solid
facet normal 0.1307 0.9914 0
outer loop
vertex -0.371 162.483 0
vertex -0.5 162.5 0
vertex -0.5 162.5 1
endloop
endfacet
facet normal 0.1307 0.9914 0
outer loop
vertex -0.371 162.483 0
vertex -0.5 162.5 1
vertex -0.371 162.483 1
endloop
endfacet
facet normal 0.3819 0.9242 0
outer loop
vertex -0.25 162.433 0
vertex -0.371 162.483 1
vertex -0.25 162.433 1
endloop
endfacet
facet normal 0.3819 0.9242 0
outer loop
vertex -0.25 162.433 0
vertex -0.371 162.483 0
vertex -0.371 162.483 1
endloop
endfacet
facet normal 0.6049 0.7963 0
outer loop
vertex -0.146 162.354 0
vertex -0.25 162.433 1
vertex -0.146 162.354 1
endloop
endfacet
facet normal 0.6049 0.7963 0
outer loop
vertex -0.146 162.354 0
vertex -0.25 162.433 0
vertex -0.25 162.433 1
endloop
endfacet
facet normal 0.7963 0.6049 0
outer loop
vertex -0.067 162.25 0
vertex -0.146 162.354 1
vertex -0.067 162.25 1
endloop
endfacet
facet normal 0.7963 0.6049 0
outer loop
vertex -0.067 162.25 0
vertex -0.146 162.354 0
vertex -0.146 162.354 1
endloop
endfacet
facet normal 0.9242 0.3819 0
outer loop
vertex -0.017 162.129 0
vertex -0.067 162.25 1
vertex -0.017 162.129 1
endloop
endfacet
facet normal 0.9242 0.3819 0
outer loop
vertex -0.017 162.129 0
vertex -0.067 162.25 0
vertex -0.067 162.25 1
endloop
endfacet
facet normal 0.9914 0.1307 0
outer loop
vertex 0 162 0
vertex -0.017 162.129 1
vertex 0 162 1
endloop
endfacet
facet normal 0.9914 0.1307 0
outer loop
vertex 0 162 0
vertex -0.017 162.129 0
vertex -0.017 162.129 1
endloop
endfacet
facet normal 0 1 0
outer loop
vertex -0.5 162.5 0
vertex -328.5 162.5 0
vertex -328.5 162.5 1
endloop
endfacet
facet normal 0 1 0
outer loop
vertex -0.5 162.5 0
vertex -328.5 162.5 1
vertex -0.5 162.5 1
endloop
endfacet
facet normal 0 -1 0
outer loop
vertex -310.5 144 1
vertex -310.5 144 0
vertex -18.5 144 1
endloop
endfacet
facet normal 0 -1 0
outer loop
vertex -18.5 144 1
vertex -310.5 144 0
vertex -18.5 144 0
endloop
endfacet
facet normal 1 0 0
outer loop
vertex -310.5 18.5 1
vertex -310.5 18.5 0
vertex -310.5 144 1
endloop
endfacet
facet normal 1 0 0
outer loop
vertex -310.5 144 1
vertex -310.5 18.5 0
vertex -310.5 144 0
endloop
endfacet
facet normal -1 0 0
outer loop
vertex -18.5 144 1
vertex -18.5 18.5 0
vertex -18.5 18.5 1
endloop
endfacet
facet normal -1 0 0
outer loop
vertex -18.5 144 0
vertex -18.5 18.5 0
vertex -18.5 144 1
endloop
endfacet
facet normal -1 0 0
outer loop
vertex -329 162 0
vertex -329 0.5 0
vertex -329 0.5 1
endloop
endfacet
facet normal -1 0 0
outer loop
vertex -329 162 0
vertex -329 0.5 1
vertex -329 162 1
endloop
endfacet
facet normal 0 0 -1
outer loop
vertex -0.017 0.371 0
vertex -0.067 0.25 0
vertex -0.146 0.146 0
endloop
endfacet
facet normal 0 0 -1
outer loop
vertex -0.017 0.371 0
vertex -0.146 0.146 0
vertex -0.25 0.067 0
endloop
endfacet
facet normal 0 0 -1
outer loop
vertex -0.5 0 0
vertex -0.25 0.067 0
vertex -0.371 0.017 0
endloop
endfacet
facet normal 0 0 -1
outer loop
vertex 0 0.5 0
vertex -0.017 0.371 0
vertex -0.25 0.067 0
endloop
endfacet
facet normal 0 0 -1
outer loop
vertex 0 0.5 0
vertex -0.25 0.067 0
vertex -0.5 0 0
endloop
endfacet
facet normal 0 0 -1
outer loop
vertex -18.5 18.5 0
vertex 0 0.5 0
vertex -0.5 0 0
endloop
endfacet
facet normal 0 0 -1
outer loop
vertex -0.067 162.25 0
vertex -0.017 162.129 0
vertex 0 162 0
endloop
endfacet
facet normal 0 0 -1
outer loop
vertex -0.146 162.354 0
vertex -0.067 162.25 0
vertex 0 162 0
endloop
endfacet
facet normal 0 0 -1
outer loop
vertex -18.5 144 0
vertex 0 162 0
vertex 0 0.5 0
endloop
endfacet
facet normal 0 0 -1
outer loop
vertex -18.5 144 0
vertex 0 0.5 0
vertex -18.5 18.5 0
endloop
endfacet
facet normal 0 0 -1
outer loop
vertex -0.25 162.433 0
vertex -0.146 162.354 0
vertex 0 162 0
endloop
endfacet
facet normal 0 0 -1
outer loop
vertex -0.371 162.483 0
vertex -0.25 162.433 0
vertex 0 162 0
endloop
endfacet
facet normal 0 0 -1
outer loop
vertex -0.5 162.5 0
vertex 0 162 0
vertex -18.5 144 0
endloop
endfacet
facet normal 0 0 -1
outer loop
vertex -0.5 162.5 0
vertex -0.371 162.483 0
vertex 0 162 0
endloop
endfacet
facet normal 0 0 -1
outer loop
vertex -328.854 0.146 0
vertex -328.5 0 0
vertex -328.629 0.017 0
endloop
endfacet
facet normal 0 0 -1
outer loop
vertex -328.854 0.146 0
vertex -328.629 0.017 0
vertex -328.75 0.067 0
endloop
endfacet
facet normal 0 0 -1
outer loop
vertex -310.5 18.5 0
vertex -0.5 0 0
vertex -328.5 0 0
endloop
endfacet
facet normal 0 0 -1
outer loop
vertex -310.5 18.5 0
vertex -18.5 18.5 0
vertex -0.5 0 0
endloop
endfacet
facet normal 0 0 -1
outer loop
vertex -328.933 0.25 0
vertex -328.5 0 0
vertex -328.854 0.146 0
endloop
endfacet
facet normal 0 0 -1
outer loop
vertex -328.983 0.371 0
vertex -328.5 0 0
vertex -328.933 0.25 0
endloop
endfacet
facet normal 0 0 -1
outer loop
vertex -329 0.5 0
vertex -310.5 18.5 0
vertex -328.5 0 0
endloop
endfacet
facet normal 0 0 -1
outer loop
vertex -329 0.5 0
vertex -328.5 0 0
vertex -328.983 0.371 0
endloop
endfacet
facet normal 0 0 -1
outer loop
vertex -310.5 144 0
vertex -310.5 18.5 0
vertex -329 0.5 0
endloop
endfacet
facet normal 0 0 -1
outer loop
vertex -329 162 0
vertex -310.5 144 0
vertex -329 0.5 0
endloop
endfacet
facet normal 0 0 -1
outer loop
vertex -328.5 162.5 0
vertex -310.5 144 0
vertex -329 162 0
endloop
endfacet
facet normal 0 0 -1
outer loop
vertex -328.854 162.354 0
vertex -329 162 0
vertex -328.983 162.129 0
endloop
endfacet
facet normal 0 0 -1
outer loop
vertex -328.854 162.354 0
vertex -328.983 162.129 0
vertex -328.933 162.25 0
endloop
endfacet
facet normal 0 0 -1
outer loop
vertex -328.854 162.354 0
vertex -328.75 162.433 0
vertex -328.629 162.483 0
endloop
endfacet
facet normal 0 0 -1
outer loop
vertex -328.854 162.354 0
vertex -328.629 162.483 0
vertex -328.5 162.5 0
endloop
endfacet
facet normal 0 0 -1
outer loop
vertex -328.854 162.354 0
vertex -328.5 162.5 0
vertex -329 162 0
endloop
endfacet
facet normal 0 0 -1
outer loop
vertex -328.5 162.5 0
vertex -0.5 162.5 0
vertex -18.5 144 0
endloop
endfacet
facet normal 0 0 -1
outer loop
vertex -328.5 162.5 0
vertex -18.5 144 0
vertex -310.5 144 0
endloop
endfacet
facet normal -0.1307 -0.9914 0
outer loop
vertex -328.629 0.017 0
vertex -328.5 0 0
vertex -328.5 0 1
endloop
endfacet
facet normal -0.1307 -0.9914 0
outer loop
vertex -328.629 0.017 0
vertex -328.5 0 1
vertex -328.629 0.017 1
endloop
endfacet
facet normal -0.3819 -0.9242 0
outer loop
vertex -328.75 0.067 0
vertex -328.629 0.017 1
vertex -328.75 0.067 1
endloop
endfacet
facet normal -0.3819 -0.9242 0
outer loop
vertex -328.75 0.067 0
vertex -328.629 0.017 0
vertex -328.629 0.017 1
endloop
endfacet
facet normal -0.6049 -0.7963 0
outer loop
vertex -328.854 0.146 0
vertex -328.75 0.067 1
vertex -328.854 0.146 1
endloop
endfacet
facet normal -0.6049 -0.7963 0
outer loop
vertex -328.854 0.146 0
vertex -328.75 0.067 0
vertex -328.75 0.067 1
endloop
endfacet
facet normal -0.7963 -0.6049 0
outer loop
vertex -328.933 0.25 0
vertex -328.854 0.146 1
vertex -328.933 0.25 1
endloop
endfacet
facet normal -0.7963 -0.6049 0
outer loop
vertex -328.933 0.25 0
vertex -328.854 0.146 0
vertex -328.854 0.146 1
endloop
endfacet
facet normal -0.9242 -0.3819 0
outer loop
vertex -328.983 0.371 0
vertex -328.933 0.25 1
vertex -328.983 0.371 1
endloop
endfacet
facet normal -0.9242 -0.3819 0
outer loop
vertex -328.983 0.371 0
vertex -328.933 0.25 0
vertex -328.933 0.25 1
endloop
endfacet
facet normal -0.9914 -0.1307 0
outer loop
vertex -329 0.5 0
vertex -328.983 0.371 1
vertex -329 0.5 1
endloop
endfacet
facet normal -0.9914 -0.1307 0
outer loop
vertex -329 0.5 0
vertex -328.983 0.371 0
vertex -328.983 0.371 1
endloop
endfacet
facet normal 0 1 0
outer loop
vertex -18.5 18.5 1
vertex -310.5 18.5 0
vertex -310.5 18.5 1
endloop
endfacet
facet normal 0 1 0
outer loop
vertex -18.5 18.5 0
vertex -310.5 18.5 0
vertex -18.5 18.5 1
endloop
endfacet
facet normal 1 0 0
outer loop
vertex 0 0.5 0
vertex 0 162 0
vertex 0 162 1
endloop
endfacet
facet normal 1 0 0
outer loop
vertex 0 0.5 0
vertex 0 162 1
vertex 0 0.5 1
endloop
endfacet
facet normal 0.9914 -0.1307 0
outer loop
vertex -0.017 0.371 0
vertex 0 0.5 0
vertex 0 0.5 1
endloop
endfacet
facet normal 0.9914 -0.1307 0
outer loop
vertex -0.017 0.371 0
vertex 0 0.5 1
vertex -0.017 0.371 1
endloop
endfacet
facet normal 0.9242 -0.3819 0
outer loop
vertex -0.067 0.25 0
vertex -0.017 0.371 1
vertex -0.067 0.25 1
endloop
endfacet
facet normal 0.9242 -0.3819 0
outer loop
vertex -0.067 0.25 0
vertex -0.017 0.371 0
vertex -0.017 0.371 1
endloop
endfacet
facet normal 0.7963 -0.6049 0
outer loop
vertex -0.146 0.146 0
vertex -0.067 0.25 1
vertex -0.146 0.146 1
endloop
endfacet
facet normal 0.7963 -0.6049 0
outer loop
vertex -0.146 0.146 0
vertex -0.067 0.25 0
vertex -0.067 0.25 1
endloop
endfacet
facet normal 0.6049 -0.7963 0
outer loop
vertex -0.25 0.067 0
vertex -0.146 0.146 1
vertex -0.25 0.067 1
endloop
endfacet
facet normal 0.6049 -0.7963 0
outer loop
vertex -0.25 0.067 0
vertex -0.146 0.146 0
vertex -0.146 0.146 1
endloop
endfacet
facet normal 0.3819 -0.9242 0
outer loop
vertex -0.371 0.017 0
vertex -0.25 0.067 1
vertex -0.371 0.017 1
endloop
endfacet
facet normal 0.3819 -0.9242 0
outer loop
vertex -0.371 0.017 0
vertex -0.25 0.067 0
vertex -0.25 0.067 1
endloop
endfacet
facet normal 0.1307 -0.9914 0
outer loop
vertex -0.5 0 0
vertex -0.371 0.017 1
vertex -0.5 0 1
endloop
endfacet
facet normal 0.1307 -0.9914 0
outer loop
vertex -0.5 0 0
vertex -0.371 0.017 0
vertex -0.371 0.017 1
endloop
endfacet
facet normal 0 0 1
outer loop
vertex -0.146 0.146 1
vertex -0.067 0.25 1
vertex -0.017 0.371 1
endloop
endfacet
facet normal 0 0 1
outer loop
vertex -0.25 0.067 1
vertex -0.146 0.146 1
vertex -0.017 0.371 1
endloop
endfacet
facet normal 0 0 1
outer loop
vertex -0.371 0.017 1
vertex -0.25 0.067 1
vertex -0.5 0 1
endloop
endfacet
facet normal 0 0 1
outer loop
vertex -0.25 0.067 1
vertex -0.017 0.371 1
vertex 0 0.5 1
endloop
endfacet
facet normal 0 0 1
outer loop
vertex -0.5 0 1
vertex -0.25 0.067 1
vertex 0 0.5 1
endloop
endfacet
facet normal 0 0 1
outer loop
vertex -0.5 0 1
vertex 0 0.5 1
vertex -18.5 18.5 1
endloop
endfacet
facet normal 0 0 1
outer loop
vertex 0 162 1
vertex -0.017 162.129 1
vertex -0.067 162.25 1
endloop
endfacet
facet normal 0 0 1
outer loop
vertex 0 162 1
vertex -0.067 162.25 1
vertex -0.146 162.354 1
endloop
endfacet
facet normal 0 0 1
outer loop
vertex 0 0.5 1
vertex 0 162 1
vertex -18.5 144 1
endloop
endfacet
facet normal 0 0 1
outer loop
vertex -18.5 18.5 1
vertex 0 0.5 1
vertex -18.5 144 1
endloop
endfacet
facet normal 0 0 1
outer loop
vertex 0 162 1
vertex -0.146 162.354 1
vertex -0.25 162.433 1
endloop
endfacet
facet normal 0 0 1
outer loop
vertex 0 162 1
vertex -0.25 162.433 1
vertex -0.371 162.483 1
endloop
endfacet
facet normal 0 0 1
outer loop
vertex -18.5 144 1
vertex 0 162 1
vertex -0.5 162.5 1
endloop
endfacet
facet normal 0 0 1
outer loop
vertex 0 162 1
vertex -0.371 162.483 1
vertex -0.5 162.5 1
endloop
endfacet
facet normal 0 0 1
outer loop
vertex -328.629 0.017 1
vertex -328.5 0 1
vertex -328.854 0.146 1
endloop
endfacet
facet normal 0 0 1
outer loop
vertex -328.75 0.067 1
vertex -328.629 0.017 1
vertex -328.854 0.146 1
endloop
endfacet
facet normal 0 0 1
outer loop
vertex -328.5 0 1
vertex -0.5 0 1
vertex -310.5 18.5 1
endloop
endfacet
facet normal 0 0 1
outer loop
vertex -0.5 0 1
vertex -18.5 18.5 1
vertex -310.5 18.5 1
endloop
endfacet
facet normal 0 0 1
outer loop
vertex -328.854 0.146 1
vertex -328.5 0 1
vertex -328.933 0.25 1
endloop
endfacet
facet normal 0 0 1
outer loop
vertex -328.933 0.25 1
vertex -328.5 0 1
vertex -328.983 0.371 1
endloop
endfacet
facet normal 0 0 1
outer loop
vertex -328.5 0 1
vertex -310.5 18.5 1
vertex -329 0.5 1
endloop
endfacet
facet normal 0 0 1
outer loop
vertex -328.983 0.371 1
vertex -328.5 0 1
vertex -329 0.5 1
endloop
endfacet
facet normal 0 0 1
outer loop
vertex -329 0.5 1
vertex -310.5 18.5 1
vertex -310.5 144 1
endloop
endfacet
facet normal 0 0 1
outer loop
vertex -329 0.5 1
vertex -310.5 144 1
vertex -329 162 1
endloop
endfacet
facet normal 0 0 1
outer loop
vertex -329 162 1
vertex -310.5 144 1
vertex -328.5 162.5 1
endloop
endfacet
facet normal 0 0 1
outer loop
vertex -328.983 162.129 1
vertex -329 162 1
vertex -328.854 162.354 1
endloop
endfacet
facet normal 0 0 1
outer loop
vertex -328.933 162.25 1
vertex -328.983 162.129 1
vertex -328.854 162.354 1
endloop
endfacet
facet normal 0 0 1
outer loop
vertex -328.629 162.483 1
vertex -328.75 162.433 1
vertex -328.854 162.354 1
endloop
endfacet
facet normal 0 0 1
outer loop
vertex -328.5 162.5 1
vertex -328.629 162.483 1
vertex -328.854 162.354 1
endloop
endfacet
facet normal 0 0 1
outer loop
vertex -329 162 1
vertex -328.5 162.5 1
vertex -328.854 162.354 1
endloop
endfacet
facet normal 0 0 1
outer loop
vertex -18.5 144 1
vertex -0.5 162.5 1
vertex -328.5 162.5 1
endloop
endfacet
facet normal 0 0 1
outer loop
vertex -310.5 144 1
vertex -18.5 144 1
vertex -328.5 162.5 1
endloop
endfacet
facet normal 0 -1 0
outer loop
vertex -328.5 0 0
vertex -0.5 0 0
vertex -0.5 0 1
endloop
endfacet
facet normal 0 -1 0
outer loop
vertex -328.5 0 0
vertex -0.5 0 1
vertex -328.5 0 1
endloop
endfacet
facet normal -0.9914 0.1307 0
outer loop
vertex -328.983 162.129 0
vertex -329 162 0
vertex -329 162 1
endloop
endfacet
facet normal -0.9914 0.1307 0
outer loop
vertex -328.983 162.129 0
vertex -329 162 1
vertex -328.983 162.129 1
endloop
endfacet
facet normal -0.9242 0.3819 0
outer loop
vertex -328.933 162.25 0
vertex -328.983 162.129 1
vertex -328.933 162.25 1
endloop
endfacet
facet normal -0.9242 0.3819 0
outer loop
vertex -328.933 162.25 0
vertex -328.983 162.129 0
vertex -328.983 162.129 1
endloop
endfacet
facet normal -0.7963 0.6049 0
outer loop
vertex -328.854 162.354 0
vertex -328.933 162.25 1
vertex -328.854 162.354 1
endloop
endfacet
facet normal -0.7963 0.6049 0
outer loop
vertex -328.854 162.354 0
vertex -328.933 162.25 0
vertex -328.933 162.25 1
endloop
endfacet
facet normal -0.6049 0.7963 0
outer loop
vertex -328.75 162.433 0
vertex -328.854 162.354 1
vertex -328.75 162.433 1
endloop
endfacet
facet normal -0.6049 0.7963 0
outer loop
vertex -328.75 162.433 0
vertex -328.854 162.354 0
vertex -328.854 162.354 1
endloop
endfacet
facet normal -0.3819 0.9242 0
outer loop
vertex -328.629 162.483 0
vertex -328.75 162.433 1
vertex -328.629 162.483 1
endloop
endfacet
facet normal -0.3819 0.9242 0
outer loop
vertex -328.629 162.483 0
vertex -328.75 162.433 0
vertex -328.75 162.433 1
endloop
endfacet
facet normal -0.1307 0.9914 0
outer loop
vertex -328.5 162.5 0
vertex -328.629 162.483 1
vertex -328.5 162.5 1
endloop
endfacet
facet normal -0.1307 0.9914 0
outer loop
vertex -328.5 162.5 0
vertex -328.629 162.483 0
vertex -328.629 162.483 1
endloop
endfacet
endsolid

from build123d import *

# Parameters (mm, degrees)
SKETCH_1_W      = 292
SKETCH_1_H      = 125.5
EXTRUDE_1_DEPTH = 1


with BuildPart() as part:
    # 스케치1 → 보스-돌출1 (new body)
    with BuildSketch(Plane.XY):
        with BuildLine():
            Line((-328.5, 162.5), (-0.5, 162.5))
            ThreePointArc((-0.5, 162.5), (-0.146446609, 162.353553391), (0, 162))
            Line((0, 162), (0, 0.5))
            ThreePointArc((0, 0.5), (-0.146446609, 0.146446609), (-0.5, 0))
            Line((-0.5, 0), (-328.5, 0))
            ThreePointArc((-328.5, 0), (-328.853553391, 0.146446609), (-329, 0.5))
            Line((-329, 0.5), (-329, 162))
            ThreePointArc((-329, 162), (-328.853553391, 162.353553391), (-328.5, 162.5))
        make_face()
        with Locations((-164.5, 81.25)):
            Rectangle(SKETCH_1_W, SKETCH_1_H, mode=Mode.SUBTRACT)
    extrude(amount=EXTRUDE_1_DEPTH)


solid = part.part
